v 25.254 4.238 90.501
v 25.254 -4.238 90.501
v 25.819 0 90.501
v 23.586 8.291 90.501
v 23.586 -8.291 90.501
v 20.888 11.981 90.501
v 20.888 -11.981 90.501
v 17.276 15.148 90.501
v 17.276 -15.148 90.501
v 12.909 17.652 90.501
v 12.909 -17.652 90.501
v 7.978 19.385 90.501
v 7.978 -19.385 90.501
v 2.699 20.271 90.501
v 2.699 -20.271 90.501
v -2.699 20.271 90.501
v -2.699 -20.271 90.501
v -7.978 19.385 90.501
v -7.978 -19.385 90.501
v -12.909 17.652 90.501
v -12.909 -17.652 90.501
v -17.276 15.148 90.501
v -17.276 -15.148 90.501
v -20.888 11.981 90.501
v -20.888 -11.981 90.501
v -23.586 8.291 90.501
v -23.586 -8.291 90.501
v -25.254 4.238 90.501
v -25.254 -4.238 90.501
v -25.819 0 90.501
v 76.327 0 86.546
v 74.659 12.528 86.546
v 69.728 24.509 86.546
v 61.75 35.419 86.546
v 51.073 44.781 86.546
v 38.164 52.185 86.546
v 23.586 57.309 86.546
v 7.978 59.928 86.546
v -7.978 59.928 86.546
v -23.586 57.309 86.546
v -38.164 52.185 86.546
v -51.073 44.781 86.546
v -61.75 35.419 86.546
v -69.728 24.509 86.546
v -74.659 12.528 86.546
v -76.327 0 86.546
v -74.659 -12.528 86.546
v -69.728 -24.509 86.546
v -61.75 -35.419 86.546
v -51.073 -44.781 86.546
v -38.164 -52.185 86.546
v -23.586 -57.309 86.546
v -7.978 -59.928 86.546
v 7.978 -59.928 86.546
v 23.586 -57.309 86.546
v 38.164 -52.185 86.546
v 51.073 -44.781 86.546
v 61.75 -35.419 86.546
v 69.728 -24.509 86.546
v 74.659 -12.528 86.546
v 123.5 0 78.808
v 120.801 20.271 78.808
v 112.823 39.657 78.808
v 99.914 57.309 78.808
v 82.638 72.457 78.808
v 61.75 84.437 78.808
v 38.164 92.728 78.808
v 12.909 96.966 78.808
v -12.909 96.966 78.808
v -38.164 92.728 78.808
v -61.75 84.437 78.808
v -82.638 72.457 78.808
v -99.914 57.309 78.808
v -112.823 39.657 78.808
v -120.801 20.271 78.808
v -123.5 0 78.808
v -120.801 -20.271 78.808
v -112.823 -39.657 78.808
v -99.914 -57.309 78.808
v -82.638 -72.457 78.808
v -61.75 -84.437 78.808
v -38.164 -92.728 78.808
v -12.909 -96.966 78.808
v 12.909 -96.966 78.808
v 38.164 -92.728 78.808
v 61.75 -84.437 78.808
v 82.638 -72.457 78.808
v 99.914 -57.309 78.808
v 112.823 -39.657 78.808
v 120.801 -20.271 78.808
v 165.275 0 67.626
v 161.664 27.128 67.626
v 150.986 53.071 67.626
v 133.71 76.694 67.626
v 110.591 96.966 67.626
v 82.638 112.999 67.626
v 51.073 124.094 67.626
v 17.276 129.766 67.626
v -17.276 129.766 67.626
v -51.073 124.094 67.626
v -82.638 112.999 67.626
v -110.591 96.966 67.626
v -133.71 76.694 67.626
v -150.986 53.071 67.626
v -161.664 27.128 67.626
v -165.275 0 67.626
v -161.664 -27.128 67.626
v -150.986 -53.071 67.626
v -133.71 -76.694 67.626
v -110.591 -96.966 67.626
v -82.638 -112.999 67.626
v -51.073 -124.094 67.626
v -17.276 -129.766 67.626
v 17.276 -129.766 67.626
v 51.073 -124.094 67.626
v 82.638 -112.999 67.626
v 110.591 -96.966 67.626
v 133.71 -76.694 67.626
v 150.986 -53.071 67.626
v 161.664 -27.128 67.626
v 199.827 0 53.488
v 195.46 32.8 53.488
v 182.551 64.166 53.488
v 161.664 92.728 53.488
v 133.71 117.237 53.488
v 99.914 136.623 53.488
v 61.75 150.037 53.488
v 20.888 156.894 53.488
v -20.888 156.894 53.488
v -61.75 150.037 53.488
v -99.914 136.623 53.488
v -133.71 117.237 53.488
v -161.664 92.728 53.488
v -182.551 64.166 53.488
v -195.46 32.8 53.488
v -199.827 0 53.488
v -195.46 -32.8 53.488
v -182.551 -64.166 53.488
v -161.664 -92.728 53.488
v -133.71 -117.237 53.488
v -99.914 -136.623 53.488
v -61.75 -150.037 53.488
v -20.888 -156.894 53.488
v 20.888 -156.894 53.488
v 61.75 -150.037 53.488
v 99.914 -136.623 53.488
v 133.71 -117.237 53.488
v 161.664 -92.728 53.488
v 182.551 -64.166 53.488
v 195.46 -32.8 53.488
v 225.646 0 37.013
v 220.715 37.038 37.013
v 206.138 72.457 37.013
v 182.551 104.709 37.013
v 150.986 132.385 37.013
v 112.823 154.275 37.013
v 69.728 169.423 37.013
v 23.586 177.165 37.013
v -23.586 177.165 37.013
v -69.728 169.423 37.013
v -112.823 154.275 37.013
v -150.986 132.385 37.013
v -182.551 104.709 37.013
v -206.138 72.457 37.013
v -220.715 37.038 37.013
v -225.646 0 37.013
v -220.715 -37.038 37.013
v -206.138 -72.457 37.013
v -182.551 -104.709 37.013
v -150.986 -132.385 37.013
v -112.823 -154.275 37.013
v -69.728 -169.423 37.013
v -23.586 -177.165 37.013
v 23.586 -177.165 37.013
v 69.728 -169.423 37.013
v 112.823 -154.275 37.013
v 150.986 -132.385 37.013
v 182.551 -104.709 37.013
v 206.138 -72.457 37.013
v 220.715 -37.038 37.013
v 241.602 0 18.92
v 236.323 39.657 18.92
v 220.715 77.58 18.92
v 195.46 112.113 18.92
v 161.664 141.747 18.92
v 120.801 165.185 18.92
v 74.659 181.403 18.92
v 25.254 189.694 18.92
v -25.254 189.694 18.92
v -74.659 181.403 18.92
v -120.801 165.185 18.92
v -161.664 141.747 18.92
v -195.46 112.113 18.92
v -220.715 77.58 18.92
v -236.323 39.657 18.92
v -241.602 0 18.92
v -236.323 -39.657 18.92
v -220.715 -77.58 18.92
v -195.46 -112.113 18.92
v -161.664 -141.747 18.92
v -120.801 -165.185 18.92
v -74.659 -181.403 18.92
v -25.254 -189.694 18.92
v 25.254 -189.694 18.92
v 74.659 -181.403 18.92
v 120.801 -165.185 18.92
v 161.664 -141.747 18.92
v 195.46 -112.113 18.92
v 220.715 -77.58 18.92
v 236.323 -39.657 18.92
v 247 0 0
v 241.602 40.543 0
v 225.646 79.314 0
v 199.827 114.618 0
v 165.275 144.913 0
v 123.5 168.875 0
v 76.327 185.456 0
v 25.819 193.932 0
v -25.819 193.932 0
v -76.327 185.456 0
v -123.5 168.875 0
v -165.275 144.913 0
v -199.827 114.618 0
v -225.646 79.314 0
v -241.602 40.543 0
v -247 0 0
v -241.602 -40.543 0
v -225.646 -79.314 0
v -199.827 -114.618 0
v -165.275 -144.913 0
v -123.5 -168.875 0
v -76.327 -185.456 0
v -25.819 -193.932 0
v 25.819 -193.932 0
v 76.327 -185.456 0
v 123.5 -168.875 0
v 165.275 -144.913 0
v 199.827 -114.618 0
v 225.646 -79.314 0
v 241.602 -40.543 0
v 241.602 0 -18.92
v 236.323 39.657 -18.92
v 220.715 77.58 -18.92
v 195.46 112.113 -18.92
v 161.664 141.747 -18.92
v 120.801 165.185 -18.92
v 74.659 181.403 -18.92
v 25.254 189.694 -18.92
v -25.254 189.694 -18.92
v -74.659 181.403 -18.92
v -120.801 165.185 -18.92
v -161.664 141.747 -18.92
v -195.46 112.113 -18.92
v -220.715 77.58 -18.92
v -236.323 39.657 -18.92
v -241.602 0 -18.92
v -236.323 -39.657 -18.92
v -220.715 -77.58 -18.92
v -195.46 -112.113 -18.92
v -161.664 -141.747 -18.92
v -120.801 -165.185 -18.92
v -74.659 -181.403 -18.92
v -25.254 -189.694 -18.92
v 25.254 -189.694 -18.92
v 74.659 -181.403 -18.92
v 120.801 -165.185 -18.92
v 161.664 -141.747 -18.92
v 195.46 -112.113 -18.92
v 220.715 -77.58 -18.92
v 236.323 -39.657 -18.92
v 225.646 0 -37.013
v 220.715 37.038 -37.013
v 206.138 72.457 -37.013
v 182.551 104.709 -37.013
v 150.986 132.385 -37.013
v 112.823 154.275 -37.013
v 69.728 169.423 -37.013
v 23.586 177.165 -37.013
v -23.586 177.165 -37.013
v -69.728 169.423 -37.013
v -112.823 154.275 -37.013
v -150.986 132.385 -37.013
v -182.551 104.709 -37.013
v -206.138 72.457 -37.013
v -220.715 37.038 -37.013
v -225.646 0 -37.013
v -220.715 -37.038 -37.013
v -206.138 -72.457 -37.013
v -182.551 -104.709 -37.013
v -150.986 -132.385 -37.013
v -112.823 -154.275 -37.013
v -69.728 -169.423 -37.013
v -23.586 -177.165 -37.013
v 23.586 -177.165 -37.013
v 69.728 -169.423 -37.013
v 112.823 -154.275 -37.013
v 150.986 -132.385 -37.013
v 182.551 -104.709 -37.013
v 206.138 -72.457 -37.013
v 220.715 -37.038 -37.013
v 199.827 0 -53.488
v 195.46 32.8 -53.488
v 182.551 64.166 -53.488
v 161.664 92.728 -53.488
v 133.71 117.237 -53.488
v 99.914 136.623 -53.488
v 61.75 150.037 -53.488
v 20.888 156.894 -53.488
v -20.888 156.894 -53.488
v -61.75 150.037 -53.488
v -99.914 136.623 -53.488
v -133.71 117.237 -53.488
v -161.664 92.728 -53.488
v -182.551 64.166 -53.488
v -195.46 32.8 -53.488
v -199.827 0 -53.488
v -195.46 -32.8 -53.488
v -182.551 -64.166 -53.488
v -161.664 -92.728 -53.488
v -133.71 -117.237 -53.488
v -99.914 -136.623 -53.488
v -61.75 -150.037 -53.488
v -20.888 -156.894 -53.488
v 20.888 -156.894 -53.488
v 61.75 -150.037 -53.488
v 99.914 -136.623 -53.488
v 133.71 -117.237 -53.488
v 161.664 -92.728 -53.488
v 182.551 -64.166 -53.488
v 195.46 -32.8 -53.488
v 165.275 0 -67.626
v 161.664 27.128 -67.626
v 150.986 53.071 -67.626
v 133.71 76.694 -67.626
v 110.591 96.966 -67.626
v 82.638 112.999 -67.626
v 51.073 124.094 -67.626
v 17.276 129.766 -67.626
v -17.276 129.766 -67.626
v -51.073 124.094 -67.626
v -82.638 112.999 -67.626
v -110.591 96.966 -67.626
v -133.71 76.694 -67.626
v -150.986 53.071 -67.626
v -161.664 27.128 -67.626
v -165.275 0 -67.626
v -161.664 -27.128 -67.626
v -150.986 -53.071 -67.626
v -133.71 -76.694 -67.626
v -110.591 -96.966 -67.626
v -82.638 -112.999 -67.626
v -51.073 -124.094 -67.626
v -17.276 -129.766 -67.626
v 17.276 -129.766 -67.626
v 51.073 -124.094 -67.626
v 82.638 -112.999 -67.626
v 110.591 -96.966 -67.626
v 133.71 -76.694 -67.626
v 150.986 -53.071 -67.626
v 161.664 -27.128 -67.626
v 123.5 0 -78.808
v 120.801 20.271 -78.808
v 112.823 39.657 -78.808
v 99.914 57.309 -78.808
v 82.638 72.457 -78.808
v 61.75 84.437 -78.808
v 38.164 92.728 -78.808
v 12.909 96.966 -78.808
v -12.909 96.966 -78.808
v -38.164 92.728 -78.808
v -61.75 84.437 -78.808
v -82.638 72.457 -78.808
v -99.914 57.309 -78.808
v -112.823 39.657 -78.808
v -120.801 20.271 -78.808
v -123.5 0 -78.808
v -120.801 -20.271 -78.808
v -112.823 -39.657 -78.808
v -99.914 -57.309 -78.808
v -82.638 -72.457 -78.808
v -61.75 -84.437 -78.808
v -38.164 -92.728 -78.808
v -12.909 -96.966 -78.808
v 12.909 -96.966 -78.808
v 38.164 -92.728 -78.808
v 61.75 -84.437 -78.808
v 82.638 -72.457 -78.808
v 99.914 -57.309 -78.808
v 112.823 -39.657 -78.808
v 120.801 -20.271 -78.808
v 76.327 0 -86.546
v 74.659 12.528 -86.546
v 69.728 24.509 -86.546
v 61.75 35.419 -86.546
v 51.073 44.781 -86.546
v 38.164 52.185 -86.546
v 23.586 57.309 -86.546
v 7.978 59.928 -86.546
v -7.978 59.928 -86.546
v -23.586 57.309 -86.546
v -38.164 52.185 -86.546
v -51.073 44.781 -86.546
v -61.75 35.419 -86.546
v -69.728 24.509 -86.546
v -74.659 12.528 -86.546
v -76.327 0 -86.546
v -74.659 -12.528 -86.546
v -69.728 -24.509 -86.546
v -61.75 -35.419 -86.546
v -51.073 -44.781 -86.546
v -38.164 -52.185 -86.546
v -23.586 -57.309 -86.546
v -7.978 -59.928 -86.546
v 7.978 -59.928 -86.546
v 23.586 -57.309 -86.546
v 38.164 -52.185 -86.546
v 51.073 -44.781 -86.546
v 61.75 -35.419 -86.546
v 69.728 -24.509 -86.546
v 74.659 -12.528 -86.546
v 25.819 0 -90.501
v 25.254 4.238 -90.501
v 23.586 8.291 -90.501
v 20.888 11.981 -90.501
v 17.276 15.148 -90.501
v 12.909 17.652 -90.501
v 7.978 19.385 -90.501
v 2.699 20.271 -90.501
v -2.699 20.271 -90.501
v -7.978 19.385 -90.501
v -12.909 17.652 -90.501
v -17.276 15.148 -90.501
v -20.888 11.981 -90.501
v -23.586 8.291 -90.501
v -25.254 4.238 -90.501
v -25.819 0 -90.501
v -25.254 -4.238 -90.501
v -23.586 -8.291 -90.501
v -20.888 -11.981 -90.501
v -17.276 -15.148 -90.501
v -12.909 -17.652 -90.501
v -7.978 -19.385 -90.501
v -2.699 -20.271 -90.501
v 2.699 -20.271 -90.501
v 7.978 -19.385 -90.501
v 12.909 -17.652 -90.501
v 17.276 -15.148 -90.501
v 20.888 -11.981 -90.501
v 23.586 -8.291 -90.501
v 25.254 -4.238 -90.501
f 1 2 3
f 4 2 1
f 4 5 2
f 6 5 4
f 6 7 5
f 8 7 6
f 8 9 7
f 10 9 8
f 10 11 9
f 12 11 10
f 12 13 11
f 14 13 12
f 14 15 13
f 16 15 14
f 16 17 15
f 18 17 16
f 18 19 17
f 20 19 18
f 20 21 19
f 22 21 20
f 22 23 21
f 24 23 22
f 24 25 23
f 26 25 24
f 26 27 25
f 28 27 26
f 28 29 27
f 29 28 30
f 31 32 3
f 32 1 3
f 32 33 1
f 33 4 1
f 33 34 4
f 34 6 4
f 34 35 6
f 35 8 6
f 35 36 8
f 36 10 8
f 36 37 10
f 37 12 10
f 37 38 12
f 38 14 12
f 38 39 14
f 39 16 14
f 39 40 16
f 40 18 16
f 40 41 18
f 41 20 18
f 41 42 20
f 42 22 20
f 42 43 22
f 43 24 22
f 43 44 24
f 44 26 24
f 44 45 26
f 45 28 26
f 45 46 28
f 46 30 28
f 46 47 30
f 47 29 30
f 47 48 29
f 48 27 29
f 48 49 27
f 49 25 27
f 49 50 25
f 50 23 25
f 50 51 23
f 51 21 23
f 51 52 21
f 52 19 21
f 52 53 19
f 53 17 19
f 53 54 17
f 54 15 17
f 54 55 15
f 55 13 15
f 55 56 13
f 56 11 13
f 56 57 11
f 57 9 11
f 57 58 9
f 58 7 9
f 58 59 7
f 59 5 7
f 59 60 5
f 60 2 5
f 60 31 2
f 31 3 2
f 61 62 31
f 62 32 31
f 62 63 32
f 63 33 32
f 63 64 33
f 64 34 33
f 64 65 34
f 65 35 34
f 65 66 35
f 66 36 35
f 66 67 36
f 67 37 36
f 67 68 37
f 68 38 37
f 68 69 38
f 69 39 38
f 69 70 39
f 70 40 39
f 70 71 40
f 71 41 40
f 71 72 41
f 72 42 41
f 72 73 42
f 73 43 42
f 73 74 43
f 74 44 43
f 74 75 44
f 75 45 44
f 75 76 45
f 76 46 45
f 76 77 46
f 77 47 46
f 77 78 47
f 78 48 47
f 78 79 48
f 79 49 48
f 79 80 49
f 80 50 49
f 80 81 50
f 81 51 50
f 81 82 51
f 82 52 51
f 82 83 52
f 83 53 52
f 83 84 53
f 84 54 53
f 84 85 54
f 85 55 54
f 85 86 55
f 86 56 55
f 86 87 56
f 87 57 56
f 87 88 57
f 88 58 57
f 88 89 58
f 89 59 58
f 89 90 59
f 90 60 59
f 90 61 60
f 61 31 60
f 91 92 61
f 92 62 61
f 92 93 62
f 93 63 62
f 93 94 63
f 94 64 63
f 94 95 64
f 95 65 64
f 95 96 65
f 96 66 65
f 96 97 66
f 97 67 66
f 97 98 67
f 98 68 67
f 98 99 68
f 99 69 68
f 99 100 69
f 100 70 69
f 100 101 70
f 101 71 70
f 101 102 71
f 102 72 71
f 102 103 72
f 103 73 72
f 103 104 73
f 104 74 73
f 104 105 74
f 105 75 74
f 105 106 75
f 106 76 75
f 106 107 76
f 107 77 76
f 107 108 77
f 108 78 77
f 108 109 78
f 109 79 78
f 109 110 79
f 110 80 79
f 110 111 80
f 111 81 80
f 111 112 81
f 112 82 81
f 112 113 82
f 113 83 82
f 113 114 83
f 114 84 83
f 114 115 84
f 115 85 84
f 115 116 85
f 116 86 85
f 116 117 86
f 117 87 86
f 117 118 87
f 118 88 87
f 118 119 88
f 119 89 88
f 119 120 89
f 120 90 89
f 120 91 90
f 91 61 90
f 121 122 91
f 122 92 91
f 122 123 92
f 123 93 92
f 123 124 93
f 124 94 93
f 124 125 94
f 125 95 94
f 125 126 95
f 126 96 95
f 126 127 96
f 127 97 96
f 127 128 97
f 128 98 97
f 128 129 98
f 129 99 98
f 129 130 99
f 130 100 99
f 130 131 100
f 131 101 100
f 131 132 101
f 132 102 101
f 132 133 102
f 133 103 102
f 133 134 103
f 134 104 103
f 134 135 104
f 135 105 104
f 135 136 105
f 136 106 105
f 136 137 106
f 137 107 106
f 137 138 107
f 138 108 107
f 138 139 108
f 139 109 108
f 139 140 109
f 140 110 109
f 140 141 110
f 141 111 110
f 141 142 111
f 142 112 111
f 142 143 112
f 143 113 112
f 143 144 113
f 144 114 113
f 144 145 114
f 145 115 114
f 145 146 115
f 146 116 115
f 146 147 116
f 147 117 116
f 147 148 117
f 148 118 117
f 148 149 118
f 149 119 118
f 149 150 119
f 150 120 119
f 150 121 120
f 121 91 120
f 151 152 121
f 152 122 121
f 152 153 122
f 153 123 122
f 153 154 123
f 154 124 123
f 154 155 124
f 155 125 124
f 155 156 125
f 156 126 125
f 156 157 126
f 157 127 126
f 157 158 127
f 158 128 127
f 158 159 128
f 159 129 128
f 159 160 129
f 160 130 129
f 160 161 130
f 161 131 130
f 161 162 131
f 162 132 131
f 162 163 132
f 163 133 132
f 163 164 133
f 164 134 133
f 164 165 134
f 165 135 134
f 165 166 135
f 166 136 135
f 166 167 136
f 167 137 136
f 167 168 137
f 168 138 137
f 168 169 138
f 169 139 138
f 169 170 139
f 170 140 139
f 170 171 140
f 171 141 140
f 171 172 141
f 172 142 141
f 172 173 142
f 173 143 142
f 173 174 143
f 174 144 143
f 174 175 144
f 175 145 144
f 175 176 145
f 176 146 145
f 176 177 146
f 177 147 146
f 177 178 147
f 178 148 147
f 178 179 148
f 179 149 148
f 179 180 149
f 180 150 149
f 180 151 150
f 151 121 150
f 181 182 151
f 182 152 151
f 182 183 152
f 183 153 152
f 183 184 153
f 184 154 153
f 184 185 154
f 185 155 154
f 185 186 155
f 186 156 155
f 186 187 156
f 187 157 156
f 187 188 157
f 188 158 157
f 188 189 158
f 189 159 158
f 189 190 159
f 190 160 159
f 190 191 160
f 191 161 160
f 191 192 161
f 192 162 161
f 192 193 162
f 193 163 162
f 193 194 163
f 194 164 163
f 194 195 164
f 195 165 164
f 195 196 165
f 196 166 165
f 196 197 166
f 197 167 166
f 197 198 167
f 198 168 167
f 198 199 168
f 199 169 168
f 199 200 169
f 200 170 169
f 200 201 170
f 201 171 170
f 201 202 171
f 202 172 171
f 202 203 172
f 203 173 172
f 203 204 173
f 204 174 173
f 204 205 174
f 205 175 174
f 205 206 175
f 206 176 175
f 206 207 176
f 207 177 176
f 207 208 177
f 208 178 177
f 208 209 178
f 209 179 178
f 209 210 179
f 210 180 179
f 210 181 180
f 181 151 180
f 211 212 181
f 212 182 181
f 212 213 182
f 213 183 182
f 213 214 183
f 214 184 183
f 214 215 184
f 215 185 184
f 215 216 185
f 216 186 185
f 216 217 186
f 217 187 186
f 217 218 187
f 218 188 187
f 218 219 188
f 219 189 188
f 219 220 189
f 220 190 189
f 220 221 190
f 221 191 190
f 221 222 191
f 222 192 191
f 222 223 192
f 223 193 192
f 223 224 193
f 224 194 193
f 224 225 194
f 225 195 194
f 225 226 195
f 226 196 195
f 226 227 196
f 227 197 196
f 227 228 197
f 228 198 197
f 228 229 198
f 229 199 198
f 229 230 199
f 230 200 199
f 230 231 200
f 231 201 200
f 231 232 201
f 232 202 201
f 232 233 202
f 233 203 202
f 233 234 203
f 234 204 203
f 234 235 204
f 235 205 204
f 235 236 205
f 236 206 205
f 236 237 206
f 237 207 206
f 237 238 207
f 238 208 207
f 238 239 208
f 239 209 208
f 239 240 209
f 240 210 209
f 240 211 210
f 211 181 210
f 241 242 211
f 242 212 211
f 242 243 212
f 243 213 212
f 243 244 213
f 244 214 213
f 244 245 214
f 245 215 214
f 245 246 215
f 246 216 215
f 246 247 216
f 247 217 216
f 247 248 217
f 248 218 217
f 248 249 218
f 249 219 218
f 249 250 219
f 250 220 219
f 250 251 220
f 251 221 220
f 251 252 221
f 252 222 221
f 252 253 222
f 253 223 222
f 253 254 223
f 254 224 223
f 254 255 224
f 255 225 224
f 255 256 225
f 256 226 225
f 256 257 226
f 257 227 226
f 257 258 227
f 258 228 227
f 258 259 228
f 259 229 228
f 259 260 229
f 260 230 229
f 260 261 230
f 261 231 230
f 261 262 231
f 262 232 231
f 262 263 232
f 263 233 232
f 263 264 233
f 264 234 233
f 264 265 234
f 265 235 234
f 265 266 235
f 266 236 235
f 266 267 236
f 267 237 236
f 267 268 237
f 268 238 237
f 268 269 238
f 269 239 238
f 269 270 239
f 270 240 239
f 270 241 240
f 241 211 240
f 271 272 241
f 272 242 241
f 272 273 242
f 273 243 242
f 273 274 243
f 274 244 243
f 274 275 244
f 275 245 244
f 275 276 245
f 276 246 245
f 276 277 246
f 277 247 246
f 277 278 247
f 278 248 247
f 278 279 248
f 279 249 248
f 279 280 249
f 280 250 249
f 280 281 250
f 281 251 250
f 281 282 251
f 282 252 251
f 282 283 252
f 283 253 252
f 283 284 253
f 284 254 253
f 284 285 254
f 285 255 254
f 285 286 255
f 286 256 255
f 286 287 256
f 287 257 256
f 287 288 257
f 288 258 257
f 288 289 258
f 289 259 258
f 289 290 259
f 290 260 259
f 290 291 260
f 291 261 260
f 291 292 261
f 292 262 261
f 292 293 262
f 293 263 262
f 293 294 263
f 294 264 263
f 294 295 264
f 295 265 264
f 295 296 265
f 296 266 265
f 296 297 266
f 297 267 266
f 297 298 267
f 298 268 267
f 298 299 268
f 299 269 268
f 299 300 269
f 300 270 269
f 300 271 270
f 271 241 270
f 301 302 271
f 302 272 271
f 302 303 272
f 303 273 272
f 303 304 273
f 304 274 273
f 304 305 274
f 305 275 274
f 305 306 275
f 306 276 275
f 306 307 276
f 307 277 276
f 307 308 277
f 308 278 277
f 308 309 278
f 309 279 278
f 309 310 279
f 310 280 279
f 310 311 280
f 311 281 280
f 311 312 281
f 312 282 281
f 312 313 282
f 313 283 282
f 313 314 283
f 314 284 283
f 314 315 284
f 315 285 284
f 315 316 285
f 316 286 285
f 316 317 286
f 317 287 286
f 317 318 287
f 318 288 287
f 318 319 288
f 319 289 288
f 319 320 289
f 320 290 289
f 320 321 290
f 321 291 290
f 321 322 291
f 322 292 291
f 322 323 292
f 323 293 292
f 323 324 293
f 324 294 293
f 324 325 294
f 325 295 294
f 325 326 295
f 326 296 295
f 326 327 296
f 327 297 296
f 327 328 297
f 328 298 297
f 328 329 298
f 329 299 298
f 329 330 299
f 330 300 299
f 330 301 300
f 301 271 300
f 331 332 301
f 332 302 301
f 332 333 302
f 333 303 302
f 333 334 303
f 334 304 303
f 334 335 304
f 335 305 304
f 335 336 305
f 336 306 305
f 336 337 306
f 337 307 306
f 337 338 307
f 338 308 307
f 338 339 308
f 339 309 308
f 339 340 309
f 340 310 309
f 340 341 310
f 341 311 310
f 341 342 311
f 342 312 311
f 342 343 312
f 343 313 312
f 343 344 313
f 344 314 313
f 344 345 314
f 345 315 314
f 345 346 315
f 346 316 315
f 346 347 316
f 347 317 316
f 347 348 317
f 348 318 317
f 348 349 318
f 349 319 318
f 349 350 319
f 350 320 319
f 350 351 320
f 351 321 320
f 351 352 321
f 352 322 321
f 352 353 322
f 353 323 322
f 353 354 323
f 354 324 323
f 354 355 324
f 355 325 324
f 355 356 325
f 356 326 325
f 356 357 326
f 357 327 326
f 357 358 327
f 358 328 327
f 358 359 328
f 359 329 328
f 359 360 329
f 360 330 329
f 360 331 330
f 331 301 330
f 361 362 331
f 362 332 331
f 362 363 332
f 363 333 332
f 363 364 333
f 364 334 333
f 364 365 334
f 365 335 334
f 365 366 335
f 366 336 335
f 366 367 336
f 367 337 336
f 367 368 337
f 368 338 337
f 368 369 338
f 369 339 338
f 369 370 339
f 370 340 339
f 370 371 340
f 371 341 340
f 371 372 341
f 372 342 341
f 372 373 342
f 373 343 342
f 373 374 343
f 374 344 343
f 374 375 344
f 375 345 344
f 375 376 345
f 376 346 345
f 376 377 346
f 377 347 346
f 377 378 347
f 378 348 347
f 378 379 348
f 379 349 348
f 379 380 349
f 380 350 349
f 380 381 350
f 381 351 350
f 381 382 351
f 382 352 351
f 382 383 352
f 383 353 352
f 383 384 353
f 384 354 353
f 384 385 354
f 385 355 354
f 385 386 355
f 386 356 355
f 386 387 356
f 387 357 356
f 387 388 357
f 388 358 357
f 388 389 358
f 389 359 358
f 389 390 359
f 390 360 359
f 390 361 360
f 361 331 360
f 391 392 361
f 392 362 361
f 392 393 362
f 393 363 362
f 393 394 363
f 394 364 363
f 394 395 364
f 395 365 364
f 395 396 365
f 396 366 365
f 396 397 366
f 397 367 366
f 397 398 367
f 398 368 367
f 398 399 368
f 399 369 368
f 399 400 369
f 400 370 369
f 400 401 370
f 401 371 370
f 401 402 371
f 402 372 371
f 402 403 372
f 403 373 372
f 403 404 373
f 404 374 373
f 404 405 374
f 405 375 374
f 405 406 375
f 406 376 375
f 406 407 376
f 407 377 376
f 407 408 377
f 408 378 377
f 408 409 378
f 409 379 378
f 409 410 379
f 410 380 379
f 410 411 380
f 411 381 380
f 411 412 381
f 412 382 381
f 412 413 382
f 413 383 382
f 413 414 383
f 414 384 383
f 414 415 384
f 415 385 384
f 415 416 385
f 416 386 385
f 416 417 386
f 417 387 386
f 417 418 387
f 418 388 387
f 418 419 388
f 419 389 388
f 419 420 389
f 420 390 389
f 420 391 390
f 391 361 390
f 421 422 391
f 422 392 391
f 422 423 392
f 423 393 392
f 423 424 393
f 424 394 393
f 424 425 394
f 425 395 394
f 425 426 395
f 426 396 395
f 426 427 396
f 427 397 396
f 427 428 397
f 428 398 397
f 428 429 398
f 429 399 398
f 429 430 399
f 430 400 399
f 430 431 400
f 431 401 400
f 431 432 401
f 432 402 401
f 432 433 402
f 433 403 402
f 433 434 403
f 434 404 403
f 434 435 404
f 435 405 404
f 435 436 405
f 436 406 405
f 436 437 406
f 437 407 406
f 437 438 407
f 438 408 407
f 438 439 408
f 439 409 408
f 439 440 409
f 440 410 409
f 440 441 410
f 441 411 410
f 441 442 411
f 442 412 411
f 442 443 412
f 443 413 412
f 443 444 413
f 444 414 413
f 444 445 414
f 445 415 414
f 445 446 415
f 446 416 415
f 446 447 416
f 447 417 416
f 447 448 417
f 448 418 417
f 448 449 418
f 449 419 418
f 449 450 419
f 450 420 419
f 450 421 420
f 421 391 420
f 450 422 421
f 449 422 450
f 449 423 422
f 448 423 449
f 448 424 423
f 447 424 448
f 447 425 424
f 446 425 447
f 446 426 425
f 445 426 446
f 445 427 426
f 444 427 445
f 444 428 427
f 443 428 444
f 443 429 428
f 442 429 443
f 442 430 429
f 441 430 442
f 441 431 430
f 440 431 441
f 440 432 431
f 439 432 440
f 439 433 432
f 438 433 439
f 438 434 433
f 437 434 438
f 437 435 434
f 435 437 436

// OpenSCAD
// Generated by SolidPython 1.0.1 on 2020-07-29 00:46:54


scale(v = [19, 15, 7]) {
	sphere(r = 13);
}
/***********************************************
*********      SolidPython code:      **********
************************************************
 
# import packages: SolidPython
from solid import *
from solid.utils import *
from itertools import chain, combinations, permutations


class Resize:

    def __init__(self, scad_file):
        self.scad_file = scad_file
        #self.scad_file = import_scad(scad_file)
        # cone/cylinder param:
        self.r1 = 0
        self.r2 = 0
        self.h = 0
        # rectangular prism param:
        self.w = 0
        self.l = 0
        # ellipse param:
        self.r = 0

    # import OpenScad code (file name corresponds to shape)


    # classify shape + parameters
    def assign(self, param1, param2, param3):
        if self.scad_file == 'cone.scad':
            self.r1 = param1
            self.r2 = param2
            self.h = param3
        elif self.scad_file == 'cylinder.scad':
            self.r1 = param1
            self.r2 = param2
            self.h = param3
        elif self.scad_file == 'rectangularPrism.scad':
            self.h = param1
            self.l = param2
            self.w = param3
        else:
            self.r = param1
            self.h = param2

    # resize parameters
    def iterate(self):
        x = range(3, 20, 2)
        i = 1
        if self.scad_file == 'cone.scad':
            tempList = list(permutations(x, 2))
            for temp in tempList:
                param1 = temp[0]
                param2 = temp[1]
                filepath = 'produced_scad_files/' + 'cone' + str(param1) + '_' + str(param2) + '_' + '.scad'
                scad_render_to_file(cylinder(h=param1, r1=param2, r2=0), filepath)

        elif self.scad_file == 'cylinder.scad':
            tempList = list(permutations(x, 3))
            for temp in tempList:
                param1 = temp[0]
                param2 = temp[1]
                filepath = 'produced_scad_files/' + 'cylinder' + str(param1) + '_' + str(param2) + '_' + '.scad'
                scad_render_to_file(cylinder(h=param1, r1=param2, r2=param2), filepath)

        elif self.scad_file == 'rectangularPrism.scad':
            tempList = list(permutations(x, 3))
            for temp in tempList:
                param1 = temp[0]
                param2 = temp[1]
                param3 = temp[2]
                filepath = 'produced_scad_files/' + 'rectangularPrism' + str(param1) + '_' + str(param2) + '_' + str(
                    param3) + '.scad'
                scad_render_to_file(cube(size=(param1, param2, param3)), filepath)

        elif self.scad_file == 'ellipse.scad':
            tempList = list(permutations(x, 4))
            for temp in tempList:
                param1 = temp[0]
                param2 = temp[1]
                param3 = temp[2]
                param4 = temp[3]
                filepath = 'produced_scad_files/' + 'ellipse' + str(param1) + '_' + str(param2) + '_' + str(param3) + '_' + str(param4) + '.scad'
                scad_render_to_file(scale([param1, param2, param3])(sphere(r=param4)), filepath)

    def render_to_scadfile(self):
        scad_render_to_file(scad, 'example.scad') 
 
************************************************/
